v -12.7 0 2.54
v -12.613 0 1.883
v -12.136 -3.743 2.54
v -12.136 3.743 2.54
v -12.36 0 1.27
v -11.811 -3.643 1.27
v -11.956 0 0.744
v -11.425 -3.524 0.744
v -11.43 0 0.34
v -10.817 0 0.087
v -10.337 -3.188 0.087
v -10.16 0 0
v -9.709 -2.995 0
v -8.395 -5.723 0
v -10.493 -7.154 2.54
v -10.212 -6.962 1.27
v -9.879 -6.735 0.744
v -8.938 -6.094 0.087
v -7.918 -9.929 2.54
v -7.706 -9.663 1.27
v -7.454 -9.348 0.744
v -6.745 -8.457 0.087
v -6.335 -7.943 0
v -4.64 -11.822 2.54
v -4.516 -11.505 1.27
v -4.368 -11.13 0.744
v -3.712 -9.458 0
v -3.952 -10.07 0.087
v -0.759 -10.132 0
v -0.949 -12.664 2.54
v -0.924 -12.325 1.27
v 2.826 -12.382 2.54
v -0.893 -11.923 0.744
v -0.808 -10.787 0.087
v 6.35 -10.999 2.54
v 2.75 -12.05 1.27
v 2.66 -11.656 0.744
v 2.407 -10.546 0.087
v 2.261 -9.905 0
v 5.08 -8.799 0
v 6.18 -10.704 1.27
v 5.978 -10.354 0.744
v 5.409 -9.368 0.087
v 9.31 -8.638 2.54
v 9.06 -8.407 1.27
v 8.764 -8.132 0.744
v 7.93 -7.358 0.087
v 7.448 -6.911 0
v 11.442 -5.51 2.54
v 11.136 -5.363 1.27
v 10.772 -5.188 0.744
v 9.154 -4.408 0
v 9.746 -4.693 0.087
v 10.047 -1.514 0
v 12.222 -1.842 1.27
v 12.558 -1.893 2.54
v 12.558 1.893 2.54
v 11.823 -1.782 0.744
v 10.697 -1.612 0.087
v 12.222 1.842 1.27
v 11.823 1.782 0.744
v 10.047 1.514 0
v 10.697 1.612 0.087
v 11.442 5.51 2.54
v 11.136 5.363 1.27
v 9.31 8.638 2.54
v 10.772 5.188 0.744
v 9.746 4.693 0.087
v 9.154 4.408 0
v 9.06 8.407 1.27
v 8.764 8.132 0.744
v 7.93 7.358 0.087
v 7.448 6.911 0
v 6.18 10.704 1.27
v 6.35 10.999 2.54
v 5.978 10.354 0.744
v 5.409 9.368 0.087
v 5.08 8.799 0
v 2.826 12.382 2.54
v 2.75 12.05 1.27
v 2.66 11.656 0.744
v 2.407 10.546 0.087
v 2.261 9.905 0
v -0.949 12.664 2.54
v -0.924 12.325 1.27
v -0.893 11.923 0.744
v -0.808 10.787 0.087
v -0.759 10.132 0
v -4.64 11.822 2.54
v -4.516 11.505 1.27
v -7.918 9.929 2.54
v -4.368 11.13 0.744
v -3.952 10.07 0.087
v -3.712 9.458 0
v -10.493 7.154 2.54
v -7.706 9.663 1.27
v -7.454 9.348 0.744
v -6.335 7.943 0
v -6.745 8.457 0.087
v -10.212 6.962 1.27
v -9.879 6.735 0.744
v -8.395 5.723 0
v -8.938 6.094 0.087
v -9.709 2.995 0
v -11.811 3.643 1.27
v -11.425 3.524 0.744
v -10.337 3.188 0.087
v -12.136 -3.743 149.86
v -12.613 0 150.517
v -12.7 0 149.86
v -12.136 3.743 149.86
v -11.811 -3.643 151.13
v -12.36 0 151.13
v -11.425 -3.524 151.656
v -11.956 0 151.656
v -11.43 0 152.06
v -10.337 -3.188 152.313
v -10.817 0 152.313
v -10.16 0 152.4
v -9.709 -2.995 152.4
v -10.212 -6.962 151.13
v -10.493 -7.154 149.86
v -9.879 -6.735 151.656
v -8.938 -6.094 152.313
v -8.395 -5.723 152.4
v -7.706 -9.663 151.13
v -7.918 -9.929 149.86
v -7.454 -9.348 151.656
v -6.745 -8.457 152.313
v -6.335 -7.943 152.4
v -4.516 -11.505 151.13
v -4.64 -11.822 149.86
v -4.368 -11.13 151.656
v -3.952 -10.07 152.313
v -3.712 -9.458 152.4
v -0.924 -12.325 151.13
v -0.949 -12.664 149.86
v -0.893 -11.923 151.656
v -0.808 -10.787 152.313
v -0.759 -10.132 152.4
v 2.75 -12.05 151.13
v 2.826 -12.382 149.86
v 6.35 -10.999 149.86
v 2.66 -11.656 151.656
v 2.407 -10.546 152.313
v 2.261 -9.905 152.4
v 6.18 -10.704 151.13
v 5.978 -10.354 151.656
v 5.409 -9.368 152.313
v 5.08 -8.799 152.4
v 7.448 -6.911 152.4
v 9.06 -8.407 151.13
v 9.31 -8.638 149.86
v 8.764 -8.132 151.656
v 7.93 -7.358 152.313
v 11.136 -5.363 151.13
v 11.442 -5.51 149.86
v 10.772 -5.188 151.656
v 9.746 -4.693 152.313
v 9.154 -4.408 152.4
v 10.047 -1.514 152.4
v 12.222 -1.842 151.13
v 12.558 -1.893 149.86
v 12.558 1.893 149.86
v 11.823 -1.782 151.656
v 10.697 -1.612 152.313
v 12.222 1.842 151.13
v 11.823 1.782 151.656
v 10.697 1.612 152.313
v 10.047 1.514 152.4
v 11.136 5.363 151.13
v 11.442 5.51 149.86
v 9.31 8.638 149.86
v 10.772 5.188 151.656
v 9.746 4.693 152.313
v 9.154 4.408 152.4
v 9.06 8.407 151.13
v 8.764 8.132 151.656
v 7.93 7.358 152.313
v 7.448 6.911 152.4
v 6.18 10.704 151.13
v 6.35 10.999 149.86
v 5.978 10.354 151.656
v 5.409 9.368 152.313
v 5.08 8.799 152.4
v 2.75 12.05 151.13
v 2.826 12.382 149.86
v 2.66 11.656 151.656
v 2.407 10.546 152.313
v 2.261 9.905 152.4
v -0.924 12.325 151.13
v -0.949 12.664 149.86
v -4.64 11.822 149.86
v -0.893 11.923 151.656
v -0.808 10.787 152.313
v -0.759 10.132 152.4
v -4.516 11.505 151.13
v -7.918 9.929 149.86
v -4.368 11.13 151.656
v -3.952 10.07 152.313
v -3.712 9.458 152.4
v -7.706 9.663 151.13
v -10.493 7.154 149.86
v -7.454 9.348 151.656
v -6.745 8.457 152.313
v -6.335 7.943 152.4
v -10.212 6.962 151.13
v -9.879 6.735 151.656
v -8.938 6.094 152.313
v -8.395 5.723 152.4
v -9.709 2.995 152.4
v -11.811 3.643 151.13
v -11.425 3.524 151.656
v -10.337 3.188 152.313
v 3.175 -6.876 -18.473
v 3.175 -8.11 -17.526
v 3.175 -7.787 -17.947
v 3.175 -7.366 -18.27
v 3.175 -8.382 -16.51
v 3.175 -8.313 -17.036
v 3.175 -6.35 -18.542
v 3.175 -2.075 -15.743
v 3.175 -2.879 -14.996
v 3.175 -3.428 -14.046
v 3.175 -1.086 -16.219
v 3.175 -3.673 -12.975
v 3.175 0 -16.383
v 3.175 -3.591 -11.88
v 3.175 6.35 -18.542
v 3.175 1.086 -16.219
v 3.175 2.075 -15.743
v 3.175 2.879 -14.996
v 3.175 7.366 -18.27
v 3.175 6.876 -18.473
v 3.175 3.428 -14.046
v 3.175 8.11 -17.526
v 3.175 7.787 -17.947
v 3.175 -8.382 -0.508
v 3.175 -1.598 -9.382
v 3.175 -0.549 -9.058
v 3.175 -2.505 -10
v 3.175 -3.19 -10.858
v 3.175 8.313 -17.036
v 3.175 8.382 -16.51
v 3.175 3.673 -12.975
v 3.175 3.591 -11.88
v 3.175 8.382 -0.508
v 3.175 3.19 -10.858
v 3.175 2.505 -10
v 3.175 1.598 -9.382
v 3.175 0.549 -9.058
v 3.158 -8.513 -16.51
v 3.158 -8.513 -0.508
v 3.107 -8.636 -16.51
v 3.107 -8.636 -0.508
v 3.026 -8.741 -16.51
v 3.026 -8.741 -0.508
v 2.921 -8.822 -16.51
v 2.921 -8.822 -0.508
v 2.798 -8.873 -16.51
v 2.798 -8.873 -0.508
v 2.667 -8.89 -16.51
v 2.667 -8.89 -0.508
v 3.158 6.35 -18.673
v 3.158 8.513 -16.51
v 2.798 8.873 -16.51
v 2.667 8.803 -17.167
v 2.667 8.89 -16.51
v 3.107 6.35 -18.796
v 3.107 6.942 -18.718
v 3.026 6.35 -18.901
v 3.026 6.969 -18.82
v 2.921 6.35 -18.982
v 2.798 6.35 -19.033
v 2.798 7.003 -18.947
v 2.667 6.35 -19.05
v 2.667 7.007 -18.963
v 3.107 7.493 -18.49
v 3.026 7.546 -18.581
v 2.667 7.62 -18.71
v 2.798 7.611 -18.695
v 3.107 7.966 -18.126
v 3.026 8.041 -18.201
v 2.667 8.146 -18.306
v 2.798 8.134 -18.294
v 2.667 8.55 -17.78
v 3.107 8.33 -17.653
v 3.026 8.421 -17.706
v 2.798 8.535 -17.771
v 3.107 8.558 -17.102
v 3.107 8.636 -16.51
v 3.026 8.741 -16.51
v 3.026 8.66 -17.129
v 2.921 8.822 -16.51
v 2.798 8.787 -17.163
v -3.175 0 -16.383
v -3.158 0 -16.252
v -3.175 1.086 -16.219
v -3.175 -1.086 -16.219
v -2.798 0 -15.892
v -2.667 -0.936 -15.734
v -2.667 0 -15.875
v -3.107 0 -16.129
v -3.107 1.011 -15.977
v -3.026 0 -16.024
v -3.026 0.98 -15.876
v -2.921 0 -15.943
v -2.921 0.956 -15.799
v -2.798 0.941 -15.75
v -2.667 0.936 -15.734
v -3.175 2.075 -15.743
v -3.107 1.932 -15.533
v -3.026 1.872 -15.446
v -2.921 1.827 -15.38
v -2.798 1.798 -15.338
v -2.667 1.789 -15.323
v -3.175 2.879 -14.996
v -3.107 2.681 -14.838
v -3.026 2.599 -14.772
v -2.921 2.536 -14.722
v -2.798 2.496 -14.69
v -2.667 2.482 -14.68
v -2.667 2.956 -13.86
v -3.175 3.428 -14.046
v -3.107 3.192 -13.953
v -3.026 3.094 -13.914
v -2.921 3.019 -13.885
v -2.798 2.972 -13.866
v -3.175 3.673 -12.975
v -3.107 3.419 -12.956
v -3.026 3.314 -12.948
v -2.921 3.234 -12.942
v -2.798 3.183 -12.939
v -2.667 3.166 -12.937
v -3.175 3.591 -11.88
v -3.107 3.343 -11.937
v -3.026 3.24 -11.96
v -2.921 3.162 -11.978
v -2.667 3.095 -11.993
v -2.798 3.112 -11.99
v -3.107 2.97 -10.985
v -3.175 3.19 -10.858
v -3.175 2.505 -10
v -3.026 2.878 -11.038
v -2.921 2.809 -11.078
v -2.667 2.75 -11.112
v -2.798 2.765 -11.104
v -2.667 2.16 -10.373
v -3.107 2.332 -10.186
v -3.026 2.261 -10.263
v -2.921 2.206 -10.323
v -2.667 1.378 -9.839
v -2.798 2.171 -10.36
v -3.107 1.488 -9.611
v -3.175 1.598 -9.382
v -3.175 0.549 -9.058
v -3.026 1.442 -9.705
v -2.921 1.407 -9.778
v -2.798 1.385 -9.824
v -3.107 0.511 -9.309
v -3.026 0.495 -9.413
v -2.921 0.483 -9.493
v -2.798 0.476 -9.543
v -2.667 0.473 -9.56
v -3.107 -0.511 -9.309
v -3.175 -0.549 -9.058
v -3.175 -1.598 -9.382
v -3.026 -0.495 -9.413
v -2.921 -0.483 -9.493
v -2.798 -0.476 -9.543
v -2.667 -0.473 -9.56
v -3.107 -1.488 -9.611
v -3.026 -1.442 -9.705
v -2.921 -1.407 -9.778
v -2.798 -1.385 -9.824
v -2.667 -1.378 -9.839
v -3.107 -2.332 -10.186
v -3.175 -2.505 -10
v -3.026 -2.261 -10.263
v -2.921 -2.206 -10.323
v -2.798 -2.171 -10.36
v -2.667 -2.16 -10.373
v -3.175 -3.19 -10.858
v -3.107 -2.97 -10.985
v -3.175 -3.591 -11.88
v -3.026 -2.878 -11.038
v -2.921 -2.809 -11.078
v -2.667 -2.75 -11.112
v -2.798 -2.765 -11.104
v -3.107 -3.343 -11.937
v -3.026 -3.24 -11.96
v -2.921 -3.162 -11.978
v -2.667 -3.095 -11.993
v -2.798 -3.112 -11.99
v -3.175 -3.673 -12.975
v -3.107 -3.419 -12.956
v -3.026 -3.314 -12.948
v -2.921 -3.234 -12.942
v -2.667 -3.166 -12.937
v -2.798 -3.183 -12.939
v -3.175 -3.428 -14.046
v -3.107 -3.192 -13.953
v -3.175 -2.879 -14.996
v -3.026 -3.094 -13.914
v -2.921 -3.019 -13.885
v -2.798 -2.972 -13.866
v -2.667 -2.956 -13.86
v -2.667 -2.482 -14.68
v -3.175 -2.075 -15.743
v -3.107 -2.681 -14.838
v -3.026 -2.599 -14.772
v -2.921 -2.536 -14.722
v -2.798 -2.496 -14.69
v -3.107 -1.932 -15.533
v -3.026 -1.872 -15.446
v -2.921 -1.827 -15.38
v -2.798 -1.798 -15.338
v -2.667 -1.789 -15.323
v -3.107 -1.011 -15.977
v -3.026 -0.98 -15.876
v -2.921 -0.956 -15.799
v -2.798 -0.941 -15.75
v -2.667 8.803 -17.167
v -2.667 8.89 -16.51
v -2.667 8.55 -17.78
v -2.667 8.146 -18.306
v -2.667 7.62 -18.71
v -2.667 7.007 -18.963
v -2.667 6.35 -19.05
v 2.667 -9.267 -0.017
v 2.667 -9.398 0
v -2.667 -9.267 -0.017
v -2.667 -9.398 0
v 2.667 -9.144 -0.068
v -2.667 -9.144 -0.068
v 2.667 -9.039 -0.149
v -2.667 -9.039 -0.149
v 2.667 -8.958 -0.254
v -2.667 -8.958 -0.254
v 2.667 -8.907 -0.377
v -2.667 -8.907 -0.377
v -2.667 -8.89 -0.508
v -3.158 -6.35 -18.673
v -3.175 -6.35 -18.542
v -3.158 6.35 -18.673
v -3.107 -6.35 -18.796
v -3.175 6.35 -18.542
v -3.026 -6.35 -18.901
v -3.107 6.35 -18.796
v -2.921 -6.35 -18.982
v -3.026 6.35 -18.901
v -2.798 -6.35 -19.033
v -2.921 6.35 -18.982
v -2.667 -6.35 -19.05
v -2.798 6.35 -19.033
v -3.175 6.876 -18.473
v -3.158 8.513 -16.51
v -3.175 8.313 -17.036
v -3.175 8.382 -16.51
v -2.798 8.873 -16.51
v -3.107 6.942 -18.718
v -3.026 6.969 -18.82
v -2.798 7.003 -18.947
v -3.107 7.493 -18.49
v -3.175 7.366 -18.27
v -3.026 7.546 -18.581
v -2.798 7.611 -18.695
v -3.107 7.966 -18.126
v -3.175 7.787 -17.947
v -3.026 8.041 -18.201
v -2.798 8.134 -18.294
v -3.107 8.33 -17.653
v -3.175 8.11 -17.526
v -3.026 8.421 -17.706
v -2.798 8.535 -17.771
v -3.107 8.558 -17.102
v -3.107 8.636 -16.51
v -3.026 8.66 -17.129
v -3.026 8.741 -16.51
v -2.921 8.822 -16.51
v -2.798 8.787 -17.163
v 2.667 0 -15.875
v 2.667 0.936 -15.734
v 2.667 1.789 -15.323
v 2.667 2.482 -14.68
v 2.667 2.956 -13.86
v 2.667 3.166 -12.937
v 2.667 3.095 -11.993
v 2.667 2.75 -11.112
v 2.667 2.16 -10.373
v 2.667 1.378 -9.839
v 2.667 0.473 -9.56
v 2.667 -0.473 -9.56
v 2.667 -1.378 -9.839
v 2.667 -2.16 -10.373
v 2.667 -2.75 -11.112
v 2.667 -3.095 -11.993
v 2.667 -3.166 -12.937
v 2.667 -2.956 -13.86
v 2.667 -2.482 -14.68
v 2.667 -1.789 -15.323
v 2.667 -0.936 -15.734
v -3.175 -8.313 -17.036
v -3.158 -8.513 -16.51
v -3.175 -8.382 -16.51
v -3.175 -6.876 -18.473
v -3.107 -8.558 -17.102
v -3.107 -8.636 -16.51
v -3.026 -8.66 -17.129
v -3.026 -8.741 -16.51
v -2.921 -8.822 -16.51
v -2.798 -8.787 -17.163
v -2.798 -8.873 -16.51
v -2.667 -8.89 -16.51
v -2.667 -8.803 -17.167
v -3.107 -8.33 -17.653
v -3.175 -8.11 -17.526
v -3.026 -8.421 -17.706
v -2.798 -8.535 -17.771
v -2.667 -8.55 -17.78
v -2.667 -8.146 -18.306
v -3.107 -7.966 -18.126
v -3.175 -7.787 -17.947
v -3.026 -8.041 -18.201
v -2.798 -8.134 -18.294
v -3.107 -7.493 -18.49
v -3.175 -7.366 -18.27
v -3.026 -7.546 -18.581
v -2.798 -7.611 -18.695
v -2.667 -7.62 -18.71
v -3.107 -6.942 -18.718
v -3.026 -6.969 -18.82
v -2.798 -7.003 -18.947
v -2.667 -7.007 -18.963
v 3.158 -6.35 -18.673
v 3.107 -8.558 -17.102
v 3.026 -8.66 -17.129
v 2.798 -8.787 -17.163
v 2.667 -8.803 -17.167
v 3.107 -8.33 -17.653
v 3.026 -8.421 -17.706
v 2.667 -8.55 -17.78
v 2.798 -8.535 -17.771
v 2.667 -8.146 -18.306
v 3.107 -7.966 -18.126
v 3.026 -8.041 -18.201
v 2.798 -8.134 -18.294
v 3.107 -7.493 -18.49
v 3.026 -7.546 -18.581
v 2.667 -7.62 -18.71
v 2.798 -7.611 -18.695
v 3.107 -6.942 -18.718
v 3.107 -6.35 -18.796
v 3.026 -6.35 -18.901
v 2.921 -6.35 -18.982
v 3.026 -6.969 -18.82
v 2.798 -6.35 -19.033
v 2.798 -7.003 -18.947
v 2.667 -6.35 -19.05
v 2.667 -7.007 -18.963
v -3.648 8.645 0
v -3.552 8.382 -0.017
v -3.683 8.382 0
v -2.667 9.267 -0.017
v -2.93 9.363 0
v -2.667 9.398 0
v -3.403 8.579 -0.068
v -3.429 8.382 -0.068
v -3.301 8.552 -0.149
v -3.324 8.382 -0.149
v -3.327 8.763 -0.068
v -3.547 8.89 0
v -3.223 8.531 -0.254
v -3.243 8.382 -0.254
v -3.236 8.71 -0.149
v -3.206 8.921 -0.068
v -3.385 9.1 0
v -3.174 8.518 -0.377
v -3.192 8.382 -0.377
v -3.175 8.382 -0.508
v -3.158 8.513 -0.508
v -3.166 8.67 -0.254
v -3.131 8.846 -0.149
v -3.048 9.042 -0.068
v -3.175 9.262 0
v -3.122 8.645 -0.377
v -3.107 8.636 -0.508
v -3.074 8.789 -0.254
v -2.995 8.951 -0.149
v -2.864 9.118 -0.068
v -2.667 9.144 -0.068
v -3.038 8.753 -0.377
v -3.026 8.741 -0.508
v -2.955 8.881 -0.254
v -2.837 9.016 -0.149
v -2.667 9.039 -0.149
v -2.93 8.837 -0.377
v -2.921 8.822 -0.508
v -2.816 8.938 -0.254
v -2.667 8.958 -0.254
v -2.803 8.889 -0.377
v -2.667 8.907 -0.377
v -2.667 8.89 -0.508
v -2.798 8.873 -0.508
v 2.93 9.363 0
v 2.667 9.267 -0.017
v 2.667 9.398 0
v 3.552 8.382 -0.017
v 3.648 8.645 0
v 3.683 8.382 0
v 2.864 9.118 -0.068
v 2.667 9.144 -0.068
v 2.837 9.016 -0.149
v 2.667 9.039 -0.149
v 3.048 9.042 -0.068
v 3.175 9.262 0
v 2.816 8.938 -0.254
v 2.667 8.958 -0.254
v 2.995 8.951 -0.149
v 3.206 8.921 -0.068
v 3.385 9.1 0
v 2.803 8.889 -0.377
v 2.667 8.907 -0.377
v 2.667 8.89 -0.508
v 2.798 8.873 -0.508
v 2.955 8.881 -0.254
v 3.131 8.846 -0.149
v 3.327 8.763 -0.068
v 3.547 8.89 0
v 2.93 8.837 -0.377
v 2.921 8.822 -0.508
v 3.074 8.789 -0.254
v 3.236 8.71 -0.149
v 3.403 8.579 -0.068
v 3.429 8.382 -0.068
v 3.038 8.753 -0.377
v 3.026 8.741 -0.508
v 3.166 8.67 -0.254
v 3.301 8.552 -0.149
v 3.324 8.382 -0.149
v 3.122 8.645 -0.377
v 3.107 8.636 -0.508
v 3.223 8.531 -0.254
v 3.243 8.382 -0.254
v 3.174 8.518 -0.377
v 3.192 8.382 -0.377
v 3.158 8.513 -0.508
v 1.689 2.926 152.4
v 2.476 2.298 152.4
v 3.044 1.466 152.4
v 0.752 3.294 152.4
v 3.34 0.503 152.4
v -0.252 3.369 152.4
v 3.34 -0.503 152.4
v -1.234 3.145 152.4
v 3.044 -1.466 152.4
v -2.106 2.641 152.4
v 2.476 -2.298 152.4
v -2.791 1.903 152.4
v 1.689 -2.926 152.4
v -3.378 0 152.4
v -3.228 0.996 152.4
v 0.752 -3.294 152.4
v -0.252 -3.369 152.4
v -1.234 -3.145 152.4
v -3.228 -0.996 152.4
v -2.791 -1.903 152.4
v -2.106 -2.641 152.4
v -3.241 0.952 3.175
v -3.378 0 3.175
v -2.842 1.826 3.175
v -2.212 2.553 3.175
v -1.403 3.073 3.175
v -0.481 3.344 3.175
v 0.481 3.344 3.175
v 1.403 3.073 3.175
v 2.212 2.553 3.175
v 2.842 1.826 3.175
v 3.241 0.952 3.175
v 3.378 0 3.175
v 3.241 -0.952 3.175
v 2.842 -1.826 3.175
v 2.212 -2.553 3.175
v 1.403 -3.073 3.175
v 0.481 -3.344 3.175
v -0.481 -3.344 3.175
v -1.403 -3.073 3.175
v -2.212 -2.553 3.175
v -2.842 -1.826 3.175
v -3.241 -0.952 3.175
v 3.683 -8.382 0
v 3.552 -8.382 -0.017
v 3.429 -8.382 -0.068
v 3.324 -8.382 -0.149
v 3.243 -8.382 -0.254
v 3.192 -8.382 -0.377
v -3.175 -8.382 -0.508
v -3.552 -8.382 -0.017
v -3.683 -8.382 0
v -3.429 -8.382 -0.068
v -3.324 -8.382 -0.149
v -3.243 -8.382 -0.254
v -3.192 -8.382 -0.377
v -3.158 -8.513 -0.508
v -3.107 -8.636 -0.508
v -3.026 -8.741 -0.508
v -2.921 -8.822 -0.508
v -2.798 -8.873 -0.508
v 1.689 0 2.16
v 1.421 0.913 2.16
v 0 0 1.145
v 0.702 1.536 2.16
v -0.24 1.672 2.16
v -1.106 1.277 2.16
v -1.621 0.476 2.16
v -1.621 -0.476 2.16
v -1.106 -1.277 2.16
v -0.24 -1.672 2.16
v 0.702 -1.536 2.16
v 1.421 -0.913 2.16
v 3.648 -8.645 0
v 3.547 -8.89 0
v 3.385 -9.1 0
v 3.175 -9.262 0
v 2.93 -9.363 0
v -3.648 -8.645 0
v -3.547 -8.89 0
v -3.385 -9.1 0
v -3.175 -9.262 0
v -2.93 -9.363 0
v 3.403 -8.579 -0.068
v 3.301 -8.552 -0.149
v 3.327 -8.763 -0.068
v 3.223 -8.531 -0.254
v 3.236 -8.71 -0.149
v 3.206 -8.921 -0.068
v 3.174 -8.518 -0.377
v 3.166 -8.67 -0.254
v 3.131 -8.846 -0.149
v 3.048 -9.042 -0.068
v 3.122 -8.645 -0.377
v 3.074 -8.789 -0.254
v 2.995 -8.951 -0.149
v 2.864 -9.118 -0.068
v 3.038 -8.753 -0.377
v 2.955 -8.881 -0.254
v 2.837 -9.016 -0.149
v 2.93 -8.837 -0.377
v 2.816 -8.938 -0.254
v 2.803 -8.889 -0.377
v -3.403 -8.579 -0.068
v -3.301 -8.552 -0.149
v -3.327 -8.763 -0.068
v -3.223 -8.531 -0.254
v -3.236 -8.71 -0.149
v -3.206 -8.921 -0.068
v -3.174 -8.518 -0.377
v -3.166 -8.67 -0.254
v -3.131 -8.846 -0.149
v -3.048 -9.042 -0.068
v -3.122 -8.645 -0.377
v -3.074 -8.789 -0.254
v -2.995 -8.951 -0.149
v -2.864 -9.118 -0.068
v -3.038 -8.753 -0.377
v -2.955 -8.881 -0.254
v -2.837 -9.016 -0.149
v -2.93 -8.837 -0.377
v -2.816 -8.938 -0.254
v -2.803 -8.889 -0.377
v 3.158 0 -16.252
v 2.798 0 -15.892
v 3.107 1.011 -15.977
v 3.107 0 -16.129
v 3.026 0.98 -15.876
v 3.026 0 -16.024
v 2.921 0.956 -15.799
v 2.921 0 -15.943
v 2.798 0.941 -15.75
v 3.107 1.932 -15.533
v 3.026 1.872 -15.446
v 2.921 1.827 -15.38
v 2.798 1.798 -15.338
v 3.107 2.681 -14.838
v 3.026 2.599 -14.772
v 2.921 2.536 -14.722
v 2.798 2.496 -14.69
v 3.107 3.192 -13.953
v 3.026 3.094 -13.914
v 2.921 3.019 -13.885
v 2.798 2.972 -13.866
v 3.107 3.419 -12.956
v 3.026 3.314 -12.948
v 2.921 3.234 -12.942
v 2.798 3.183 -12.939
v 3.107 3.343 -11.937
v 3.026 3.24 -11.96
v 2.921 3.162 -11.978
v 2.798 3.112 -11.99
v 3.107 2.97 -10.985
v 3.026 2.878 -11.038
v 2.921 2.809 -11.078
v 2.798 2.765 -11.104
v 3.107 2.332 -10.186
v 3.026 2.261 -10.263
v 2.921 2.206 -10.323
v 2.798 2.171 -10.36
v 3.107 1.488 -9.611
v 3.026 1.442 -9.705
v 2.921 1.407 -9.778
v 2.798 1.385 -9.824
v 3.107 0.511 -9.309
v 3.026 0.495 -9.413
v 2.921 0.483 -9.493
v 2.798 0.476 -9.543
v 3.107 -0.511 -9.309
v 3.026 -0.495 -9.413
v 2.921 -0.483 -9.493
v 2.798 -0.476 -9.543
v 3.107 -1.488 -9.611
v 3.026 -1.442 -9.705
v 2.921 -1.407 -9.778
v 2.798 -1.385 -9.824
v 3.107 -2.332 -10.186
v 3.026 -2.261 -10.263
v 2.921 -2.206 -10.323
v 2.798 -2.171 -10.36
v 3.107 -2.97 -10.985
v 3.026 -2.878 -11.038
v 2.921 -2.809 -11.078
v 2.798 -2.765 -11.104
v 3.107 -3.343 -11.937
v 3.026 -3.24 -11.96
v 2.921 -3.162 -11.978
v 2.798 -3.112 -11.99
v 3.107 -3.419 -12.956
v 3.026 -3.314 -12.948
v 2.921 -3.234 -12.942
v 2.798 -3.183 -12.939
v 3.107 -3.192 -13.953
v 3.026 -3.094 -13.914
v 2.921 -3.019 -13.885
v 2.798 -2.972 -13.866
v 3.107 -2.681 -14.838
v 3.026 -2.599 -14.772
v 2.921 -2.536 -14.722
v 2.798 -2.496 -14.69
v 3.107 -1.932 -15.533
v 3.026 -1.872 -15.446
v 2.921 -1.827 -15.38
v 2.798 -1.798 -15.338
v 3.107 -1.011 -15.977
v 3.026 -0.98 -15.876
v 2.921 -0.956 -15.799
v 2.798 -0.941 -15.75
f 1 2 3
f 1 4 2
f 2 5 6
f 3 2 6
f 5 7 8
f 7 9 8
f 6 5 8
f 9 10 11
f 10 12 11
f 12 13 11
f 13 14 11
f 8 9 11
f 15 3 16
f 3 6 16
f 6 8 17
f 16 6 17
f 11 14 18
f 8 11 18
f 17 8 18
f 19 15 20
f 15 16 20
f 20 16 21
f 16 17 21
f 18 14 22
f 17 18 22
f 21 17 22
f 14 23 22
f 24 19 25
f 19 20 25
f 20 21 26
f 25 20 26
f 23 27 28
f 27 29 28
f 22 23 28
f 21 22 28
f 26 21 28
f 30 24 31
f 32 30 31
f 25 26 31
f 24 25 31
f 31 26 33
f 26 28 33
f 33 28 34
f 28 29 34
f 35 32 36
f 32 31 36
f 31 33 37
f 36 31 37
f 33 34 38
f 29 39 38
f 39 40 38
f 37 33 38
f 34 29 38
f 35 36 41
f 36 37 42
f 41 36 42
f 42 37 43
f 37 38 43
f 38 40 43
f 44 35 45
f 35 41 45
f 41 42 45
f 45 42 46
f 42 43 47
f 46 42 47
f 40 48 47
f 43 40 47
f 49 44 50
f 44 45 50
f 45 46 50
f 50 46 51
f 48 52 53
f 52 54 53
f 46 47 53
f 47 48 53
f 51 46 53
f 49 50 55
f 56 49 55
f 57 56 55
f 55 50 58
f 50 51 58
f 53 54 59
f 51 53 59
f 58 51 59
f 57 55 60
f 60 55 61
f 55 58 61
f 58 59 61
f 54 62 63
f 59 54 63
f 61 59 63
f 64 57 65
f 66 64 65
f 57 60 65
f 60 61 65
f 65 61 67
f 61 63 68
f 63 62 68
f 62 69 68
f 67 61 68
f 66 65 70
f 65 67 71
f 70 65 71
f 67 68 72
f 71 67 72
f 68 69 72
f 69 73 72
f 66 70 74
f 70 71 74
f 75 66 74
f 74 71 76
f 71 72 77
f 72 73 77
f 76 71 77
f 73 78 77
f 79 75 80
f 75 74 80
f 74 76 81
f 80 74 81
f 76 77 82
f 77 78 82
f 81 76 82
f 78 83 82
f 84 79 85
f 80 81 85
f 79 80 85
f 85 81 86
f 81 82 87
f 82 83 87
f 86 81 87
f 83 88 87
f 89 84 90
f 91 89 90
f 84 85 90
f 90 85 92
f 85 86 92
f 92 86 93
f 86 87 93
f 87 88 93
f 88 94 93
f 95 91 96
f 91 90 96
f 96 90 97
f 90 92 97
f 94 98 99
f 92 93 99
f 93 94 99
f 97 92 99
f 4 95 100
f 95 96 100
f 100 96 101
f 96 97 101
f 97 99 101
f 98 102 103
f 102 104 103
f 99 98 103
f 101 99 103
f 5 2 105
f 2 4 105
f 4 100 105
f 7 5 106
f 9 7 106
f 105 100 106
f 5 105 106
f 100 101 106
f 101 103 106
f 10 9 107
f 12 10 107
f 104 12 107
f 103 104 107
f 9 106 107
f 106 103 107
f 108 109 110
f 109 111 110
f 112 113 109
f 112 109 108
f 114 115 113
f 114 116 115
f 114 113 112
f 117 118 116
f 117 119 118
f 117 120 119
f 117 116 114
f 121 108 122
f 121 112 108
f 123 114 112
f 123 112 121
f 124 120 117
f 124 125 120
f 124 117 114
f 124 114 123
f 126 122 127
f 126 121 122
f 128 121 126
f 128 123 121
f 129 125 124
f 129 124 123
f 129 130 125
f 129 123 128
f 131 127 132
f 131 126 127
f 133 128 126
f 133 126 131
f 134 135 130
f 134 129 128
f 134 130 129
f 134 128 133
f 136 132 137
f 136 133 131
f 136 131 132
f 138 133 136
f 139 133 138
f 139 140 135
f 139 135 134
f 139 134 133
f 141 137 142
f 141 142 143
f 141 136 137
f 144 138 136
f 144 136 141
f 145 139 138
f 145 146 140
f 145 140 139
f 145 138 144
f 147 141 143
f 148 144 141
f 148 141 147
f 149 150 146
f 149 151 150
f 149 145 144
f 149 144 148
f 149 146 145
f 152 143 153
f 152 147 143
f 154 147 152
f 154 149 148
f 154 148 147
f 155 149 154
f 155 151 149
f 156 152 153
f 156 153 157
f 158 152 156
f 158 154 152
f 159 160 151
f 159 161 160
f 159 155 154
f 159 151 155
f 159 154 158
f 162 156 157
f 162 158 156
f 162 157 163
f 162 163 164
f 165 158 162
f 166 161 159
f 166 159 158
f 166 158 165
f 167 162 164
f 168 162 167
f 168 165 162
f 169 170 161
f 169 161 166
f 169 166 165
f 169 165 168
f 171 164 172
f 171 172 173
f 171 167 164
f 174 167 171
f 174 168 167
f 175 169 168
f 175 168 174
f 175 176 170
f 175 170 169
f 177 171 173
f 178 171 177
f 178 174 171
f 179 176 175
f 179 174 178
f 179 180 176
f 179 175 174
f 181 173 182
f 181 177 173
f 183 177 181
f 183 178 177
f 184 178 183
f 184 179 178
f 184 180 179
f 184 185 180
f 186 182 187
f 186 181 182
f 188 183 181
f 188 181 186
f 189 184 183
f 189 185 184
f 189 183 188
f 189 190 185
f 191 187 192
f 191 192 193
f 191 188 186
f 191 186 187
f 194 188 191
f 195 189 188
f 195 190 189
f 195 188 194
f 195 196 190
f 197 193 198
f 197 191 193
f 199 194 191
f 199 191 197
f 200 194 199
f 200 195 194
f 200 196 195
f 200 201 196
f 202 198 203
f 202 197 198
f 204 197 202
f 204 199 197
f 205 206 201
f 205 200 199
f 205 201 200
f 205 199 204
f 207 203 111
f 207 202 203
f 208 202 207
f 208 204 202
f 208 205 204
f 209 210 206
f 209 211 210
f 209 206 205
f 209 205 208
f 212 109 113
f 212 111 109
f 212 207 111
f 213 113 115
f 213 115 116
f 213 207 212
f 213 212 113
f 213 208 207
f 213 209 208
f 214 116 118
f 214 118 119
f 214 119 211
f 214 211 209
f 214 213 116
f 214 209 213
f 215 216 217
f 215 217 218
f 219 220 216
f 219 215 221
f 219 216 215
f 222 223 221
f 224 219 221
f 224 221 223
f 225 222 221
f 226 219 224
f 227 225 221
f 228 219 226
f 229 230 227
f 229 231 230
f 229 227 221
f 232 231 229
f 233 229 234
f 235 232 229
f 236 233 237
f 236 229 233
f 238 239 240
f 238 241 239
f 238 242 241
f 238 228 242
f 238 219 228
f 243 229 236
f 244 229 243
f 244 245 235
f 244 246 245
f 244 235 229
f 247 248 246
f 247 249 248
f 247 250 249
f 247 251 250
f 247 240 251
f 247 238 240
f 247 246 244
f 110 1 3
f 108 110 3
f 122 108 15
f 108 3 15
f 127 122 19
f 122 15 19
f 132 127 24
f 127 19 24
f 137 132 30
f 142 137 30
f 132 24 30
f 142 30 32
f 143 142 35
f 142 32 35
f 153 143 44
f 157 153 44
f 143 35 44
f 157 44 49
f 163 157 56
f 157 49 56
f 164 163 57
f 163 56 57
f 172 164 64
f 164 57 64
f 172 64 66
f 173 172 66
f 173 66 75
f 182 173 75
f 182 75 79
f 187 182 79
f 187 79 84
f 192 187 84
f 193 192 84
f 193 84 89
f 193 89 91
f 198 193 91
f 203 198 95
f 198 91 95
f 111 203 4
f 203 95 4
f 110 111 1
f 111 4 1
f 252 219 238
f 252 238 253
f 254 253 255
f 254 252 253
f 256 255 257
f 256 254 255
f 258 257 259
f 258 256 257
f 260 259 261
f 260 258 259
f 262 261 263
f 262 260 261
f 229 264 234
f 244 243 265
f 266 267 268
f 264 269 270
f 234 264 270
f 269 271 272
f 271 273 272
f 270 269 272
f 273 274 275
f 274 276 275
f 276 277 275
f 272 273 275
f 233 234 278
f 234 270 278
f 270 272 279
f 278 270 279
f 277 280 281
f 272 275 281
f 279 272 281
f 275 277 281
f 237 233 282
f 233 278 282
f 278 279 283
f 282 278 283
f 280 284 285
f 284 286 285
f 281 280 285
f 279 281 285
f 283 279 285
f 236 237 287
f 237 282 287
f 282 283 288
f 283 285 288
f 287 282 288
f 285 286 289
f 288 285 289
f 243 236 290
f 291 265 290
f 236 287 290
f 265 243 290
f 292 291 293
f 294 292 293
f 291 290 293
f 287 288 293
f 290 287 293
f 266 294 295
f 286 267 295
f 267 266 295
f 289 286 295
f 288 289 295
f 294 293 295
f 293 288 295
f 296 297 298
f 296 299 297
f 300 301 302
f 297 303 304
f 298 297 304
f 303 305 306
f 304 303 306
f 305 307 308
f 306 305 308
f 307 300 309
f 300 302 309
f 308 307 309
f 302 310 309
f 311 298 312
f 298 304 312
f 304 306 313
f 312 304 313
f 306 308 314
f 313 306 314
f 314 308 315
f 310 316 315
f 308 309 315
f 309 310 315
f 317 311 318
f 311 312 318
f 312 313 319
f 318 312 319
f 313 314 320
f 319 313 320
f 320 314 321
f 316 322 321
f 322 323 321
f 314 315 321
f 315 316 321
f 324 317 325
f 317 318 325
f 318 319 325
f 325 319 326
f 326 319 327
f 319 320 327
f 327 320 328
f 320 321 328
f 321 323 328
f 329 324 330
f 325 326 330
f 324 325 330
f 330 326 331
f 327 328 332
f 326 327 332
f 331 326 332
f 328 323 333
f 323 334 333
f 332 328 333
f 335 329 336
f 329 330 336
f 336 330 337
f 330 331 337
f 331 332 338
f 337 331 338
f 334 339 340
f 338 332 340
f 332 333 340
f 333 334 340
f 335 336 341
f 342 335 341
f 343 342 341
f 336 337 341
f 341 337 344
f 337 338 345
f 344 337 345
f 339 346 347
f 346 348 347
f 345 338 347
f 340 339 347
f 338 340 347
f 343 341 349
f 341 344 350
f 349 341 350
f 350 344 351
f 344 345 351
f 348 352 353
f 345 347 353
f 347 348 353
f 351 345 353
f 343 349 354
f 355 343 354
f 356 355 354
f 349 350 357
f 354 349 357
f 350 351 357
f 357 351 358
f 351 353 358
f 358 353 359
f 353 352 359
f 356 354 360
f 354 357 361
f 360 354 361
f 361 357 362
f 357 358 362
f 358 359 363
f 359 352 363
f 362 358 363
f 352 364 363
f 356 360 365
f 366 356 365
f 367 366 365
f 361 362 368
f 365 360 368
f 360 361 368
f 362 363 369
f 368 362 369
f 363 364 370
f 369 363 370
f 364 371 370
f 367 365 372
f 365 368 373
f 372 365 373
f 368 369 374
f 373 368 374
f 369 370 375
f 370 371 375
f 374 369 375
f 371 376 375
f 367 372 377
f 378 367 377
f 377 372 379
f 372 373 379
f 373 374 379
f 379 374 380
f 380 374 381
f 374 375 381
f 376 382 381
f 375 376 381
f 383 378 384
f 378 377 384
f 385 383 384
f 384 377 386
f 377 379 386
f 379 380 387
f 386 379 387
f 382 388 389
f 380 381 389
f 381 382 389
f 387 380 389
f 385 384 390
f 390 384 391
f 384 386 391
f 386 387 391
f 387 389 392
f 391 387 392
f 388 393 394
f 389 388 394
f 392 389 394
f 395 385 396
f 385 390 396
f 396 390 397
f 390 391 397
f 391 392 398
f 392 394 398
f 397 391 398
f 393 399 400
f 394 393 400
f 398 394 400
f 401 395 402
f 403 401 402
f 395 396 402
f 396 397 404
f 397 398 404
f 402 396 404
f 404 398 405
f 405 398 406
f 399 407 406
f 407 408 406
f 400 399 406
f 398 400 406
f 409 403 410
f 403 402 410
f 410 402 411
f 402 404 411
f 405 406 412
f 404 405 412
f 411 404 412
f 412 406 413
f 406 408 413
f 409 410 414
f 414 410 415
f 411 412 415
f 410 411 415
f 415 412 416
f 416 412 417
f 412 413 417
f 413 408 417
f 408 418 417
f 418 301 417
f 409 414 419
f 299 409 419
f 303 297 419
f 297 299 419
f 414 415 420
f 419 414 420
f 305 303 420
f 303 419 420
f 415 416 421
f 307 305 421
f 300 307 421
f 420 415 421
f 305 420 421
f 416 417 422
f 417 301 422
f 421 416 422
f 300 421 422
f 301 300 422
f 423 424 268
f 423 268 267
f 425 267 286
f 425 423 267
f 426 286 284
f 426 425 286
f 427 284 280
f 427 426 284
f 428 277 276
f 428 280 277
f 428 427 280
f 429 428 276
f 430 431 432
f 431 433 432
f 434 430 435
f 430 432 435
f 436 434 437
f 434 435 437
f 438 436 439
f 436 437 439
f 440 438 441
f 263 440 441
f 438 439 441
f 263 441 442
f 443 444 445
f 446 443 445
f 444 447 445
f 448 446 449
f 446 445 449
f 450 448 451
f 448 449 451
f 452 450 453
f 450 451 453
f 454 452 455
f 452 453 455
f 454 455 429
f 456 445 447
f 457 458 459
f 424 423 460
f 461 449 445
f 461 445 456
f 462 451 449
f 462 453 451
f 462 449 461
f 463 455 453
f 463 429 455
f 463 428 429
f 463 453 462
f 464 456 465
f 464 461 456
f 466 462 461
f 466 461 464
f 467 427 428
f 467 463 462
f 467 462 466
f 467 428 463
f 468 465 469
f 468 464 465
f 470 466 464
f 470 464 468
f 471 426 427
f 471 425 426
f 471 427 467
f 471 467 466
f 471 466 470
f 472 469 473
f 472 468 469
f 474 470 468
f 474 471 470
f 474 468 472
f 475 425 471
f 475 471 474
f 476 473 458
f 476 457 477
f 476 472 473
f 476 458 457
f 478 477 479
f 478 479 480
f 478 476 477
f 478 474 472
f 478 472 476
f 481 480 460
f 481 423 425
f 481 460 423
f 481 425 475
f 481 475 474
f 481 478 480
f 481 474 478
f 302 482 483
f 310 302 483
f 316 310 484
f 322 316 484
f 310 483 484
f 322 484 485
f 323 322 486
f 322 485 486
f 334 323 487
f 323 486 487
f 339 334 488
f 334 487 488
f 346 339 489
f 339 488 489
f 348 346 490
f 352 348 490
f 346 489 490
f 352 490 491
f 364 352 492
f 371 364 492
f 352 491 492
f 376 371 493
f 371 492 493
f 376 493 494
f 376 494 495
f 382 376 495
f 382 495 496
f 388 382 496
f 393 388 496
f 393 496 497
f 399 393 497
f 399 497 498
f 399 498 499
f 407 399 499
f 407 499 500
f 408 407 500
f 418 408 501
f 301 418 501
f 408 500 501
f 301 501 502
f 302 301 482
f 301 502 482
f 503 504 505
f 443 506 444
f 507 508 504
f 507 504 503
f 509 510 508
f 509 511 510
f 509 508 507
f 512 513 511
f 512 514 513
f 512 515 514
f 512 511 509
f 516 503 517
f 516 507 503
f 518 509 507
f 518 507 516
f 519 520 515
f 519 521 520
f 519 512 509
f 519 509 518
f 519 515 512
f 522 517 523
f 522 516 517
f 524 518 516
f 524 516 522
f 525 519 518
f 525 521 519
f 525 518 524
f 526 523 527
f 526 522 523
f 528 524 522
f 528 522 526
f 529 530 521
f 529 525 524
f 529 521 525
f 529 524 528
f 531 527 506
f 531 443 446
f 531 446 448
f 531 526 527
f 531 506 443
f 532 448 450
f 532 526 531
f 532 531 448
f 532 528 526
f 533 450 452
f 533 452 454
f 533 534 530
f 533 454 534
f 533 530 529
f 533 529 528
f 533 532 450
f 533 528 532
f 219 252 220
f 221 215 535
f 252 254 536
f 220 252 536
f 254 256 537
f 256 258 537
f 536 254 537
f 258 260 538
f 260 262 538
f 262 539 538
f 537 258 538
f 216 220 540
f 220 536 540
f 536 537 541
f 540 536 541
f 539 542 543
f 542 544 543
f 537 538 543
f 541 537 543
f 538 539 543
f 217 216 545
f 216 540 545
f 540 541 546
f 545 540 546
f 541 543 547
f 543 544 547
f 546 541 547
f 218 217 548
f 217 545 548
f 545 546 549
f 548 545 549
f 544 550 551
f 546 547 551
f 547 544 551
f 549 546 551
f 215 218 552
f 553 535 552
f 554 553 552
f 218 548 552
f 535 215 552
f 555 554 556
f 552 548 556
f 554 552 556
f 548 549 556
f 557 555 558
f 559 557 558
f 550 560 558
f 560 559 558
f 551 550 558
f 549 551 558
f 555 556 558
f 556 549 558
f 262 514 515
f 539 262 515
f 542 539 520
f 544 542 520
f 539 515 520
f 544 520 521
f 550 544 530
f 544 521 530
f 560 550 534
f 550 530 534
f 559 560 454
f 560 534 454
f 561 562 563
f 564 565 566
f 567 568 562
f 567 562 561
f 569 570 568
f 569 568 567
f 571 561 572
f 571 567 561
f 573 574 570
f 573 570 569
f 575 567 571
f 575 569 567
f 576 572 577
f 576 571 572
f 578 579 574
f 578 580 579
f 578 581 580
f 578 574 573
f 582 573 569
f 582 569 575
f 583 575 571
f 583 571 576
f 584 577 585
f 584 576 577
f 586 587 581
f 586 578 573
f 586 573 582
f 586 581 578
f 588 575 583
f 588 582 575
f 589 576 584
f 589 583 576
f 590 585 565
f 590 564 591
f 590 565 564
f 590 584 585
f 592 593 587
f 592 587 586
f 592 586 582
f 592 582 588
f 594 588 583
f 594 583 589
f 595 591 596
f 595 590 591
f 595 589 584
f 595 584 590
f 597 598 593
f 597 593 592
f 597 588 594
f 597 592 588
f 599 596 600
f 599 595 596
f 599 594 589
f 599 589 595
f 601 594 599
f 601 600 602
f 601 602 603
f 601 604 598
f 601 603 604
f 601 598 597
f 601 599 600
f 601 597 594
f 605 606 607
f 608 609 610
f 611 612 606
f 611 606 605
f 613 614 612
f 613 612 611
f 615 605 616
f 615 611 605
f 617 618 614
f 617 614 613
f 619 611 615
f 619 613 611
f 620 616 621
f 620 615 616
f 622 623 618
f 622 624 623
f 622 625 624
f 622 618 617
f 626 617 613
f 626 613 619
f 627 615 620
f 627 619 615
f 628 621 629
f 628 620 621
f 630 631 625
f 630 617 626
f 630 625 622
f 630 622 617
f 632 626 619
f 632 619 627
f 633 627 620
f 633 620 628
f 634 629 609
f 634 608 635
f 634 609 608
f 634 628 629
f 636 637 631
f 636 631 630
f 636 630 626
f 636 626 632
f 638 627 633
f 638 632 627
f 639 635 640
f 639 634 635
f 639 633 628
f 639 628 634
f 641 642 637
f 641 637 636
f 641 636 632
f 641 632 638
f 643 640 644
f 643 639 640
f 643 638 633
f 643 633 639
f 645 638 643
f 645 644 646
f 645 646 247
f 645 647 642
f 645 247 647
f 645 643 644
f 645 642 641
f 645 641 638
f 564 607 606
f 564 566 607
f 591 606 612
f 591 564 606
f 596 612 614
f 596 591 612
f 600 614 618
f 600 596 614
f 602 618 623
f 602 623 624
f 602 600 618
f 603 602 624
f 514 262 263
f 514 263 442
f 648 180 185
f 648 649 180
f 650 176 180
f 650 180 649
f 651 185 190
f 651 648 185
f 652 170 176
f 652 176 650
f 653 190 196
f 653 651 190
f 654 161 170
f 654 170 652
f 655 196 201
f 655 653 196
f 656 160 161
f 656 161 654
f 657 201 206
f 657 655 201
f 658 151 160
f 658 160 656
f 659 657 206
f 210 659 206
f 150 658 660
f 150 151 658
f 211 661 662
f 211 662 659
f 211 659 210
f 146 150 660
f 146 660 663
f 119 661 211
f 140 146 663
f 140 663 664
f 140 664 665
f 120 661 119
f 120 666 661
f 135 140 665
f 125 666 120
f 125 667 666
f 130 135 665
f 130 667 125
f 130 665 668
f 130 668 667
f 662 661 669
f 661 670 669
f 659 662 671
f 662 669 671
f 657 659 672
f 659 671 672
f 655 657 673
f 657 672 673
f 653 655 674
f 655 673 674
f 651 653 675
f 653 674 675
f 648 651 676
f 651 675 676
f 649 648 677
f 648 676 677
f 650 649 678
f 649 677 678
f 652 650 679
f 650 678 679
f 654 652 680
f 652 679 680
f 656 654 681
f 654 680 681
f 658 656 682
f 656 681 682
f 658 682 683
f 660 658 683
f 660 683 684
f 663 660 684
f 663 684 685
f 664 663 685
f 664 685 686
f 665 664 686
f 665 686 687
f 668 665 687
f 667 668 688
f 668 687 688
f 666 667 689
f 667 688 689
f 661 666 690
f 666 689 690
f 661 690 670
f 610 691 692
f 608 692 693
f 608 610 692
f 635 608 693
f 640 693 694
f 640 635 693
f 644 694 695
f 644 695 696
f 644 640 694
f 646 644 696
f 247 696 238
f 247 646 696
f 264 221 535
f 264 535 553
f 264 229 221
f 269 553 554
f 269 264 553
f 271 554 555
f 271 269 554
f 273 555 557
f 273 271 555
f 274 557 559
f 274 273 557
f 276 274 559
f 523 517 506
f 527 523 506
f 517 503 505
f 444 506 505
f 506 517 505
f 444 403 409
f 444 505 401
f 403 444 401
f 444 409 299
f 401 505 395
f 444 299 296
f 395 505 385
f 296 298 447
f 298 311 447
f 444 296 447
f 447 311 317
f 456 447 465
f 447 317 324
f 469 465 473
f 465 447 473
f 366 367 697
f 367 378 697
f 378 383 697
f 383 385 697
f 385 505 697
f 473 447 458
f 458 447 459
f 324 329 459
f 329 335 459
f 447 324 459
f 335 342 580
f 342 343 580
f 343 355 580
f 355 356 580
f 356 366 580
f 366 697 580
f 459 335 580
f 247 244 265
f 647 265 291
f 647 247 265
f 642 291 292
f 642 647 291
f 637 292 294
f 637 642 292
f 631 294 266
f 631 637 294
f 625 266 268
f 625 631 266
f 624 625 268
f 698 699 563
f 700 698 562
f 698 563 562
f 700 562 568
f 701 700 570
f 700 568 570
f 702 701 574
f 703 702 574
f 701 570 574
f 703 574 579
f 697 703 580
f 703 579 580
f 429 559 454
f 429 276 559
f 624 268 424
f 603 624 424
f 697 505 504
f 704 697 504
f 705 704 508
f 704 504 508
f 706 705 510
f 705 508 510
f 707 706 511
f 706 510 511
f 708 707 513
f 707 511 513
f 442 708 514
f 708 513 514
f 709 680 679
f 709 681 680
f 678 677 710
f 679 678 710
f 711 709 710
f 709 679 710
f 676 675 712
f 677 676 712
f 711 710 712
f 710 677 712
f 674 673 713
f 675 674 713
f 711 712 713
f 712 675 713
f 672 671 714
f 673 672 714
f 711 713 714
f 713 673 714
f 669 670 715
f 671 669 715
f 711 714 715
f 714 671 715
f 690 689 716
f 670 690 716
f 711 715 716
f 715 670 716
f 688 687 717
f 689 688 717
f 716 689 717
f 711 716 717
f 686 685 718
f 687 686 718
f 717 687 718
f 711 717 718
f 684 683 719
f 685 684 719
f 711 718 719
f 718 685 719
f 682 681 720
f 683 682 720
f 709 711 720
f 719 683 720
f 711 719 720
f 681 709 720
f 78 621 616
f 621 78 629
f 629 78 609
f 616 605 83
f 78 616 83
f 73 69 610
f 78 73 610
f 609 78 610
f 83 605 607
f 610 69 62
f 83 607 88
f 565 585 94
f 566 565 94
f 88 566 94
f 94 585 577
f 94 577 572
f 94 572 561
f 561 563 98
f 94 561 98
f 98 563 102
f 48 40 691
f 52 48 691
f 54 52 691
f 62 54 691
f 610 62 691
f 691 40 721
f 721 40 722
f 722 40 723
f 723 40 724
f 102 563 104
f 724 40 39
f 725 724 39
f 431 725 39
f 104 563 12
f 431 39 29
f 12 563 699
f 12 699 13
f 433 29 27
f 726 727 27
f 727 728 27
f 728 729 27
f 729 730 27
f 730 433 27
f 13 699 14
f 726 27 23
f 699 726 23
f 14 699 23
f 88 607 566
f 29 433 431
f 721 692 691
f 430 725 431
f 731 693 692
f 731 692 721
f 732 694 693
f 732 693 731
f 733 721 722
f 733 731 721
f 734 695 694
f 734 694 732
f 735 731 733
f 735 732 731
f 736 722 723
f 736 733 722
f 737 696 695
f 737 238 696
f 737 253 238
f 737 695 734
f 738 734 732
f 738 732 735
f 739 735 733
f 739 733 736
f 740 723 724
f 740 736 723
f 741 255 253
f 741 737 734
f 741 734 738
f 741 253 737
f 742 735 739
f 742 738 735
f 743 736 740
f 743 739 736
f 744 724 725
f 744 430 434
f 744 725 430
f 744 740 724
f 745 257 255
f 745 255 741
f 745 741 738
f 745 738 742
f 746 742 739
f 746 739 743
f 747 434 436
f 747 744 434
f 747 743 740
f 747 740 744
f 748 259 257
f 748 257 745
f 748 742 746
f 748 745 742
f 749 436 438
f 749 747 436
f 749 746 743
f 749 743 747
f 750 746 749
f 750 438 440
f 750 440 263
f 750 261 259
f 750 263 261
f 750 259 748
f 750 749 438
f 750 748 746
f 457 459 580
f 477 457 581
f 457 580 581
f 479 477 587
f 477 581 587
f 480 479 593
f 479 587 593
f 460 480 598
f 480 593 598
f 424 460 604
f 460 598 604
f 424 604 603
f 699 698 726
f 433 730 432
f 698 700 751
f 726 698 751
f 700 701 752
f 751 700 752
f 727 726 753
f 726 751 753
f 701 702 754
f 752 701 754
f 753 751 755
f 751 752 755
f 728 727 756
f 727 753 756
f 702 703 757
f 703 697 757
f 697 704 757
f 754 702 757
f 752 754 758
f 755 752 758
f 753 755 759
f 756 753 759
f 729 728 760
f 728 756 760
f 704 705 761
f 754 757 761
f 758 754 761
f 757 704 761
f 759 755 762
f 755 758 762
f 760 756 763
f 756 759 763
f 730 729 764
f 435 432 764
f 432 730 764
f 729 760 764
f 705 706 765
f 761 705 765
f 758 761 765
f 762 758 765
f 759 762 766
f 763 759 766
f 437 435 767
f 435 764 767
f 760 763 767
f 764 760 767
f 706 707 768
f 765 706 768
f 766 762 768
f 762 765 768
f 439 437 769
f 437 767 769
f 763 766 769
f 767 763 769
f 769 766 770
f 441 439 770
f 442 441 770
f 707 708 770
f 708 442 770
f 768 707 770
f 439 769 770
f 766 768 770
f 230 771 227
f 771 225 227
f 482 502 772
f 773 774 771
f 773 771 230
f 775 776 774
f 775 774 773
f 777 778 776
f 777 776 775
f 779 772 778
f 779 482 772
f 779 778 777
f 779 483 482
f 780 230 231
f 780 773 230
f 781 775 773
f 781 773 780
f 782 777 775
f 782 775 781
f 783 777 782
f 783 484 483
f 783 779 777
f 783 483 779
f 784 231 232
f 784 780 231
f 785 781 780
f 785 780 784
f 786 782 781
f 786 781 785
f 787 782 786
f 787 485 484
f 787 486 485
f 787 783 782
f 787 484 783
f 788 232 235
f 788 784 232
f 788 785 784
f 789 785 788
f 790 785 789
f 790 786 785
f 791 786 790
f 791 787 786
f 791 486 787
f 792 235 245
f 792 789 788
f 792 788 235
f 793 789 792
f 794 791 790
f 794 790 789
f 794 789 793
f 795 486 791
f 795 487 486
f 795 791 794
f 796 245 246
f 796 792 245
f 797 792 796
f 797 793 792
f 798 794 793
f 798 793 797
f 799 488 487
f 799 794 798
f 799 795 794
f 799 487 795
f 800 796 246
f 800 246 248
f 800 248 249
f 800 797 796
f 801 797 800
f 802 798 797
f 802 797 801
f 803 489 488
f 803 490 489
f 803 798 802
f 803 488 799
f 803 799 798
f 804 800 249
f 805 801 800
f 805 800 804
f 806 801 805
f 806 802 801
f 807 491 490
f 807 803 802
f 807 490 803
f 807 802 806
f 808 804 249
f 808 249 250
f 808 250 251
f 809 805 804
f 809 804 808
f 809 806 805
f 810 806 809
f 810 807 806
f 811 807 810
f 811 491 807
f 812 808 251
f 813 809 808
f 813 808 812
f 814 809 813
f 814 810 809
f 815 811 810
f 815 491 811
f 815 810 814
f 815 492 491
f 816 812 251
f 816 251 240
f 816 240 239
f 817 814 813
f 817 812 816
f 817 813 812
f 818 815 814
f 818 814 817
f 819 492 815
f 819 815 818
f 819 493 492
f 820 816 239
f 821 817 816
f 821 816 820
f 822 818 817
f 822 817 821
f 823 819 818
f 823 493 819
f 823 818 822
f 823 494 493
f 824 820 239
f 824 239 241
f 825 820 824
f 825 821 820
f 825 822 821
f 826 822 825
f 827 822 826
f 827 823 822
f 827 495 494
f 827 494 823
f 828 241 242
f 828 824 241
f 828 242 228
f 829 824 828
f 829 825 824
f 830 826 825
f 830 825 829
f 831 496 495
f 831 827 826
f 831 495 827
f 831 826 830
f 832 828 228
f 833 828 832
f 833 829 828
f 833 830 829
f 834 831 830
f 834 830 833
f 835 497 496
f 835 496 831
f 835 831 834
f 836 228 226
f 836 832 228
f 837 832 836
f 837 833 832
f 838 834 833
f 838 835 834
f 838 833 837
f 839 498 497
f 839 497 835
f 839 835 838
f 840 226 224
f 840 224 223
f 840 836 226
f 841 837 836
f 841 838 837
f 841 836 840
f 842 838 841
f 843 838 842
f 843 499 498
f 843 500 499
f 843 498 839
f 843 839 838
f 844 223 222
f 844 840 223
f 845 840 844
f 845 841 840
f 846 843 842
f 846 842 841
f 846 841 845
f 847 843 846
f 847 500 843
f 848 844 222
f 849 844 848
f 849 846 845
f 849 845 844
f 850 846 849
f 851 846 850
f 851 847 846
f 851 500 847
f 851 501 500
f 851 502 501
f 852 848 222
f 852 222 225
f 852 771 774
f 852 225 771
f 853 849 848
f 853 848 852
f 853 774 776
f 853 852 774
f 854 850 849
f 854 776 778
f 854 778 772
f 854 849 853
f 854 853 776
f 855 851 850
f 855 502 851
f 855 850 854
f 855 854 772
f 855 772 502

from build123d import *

# Parameters (mm, degrees)
SKETCH1_R                   = 12.7
EXTRUDE1_DEPTH              = 152.4
F_1_4_CLEARANCE_HOLE1_D     = 6.7564
F_1_4_CLEARANCE_HOLE1_DEPTH = 149.225
F_1_4_CLEARANCE_HOLE1_TIP   = 2.029827343
SKETCH4_W                   = 6.35
SKETCH4_H                   = 17.78
EXTRUDE2_DEPTH              = 19.05
SKETCH5_R                   = 3.175
EXTRUDE3_DEPTH              = 12.7
FILLET1_R                   = 2.54
FILLET2_R                   = 2.54
FILLET3_R                   = 0.508


with BuildPart() as part:
    # Sketch1 → Extrude1 (new body)
    with BuildSketch(Plane.XY):
        with Locations(Location((0, 0, 0), (0, 0, 180))):
            Circle(SKETCH1_R)
    extrude(amount=EXTRUDE1_DEPTH)

    # 1/4 Clearance Hole1
    with Locations(Plane.XY.offset(152.4)):
        with Locations((0, 0)):
            Hole(F_1_4_CLEARANCE_HOLE1_D / 2, depth=F_1_4_CLEARANCE_HOLE1_DEPTH)
            with Locations((0, 0, -(F_1_4_CLEARANCE_HOLE1_DEPTH + F_1_4_CLEARANCE_HOLE1_TIP / 2))):  # 118° drill point
                Cone(0, F_1_4_CLEARANCE_HOLE1_D / 2, F_1_4_CLEARANCE_HOLE1_TIP, mode=Mode.SUBTRACT)

    # Sketch4 → Extrude2 (add)
    with BuildSketch(Plane(origin=(0, 0, 0), x_dir=(-1, 0, 0), z_dir=(0, 0, -1))):
        Rectangle(SKETCH4_W, SKETCH4_H)
    extrude(amount=EXTRUDE2_DEPTH)

    # Sketch5 → Extrude3 (cut, symmetric)
    with BuildSketch(Plane(origin=(0, 0, 0), x_dir=(0, 0, -1), z_dir=(1, 0, 0))):
        with Locations((12.7, 0)):
            Circle(SKETCH5_R)
    extrude(amount=EXTRUDE3_DEPTH, both=True, mode=Mode.SUBTRACT)

    # Fillet1
    fillet1_edges = [part.edges().sort_by_distance(p)[0] for p in [
        (12.7, 0, 152.4),
    ]]
    fillet(fillet1_edges, radius=FILLET1_R)

    # Fillet2
    fillet2_edges = [part.edges().sort_by_distance(p)[0] for p in [
        (0, 8.89, -19.05),
        (0, -8.89, -19.05),
        (12.7, 0, 0),
    ]]
    fillet(fillet2_edges, radius=FILLET2_R)

    # Fillet3
    fillet3_edges = [part.edges().sort_by_distance(p)[0] for p in [
        (-3.175, 0, 0),
        (0, 8.89, 0),
        (3.175, 0, 0),
        (0, -8.89, 0),
        (3.175, 0, -9.525),
        (-3.175, 0, -9.525),
        (-3.175, 0, -19.05),
        (3.175, 0, -19.05),
        (-3.175, 8.89, -8.255),
        (-3.175, -8.89, -8.255),
        (-3.175, 8.146051224, -18.306051224),
        (-3.175, -8.146051224, -18.306051224),
        (3.175, -8.89, -8.255),
        (3.175, 8.89, -8.255),
        (3.175, 8.146051224, -18.306051224),
        (3.175, -8.146051224, -18.306051224),
    ]]
    fillet(fillet3_edges, radius=FILLET3_R)


solid = part.part
